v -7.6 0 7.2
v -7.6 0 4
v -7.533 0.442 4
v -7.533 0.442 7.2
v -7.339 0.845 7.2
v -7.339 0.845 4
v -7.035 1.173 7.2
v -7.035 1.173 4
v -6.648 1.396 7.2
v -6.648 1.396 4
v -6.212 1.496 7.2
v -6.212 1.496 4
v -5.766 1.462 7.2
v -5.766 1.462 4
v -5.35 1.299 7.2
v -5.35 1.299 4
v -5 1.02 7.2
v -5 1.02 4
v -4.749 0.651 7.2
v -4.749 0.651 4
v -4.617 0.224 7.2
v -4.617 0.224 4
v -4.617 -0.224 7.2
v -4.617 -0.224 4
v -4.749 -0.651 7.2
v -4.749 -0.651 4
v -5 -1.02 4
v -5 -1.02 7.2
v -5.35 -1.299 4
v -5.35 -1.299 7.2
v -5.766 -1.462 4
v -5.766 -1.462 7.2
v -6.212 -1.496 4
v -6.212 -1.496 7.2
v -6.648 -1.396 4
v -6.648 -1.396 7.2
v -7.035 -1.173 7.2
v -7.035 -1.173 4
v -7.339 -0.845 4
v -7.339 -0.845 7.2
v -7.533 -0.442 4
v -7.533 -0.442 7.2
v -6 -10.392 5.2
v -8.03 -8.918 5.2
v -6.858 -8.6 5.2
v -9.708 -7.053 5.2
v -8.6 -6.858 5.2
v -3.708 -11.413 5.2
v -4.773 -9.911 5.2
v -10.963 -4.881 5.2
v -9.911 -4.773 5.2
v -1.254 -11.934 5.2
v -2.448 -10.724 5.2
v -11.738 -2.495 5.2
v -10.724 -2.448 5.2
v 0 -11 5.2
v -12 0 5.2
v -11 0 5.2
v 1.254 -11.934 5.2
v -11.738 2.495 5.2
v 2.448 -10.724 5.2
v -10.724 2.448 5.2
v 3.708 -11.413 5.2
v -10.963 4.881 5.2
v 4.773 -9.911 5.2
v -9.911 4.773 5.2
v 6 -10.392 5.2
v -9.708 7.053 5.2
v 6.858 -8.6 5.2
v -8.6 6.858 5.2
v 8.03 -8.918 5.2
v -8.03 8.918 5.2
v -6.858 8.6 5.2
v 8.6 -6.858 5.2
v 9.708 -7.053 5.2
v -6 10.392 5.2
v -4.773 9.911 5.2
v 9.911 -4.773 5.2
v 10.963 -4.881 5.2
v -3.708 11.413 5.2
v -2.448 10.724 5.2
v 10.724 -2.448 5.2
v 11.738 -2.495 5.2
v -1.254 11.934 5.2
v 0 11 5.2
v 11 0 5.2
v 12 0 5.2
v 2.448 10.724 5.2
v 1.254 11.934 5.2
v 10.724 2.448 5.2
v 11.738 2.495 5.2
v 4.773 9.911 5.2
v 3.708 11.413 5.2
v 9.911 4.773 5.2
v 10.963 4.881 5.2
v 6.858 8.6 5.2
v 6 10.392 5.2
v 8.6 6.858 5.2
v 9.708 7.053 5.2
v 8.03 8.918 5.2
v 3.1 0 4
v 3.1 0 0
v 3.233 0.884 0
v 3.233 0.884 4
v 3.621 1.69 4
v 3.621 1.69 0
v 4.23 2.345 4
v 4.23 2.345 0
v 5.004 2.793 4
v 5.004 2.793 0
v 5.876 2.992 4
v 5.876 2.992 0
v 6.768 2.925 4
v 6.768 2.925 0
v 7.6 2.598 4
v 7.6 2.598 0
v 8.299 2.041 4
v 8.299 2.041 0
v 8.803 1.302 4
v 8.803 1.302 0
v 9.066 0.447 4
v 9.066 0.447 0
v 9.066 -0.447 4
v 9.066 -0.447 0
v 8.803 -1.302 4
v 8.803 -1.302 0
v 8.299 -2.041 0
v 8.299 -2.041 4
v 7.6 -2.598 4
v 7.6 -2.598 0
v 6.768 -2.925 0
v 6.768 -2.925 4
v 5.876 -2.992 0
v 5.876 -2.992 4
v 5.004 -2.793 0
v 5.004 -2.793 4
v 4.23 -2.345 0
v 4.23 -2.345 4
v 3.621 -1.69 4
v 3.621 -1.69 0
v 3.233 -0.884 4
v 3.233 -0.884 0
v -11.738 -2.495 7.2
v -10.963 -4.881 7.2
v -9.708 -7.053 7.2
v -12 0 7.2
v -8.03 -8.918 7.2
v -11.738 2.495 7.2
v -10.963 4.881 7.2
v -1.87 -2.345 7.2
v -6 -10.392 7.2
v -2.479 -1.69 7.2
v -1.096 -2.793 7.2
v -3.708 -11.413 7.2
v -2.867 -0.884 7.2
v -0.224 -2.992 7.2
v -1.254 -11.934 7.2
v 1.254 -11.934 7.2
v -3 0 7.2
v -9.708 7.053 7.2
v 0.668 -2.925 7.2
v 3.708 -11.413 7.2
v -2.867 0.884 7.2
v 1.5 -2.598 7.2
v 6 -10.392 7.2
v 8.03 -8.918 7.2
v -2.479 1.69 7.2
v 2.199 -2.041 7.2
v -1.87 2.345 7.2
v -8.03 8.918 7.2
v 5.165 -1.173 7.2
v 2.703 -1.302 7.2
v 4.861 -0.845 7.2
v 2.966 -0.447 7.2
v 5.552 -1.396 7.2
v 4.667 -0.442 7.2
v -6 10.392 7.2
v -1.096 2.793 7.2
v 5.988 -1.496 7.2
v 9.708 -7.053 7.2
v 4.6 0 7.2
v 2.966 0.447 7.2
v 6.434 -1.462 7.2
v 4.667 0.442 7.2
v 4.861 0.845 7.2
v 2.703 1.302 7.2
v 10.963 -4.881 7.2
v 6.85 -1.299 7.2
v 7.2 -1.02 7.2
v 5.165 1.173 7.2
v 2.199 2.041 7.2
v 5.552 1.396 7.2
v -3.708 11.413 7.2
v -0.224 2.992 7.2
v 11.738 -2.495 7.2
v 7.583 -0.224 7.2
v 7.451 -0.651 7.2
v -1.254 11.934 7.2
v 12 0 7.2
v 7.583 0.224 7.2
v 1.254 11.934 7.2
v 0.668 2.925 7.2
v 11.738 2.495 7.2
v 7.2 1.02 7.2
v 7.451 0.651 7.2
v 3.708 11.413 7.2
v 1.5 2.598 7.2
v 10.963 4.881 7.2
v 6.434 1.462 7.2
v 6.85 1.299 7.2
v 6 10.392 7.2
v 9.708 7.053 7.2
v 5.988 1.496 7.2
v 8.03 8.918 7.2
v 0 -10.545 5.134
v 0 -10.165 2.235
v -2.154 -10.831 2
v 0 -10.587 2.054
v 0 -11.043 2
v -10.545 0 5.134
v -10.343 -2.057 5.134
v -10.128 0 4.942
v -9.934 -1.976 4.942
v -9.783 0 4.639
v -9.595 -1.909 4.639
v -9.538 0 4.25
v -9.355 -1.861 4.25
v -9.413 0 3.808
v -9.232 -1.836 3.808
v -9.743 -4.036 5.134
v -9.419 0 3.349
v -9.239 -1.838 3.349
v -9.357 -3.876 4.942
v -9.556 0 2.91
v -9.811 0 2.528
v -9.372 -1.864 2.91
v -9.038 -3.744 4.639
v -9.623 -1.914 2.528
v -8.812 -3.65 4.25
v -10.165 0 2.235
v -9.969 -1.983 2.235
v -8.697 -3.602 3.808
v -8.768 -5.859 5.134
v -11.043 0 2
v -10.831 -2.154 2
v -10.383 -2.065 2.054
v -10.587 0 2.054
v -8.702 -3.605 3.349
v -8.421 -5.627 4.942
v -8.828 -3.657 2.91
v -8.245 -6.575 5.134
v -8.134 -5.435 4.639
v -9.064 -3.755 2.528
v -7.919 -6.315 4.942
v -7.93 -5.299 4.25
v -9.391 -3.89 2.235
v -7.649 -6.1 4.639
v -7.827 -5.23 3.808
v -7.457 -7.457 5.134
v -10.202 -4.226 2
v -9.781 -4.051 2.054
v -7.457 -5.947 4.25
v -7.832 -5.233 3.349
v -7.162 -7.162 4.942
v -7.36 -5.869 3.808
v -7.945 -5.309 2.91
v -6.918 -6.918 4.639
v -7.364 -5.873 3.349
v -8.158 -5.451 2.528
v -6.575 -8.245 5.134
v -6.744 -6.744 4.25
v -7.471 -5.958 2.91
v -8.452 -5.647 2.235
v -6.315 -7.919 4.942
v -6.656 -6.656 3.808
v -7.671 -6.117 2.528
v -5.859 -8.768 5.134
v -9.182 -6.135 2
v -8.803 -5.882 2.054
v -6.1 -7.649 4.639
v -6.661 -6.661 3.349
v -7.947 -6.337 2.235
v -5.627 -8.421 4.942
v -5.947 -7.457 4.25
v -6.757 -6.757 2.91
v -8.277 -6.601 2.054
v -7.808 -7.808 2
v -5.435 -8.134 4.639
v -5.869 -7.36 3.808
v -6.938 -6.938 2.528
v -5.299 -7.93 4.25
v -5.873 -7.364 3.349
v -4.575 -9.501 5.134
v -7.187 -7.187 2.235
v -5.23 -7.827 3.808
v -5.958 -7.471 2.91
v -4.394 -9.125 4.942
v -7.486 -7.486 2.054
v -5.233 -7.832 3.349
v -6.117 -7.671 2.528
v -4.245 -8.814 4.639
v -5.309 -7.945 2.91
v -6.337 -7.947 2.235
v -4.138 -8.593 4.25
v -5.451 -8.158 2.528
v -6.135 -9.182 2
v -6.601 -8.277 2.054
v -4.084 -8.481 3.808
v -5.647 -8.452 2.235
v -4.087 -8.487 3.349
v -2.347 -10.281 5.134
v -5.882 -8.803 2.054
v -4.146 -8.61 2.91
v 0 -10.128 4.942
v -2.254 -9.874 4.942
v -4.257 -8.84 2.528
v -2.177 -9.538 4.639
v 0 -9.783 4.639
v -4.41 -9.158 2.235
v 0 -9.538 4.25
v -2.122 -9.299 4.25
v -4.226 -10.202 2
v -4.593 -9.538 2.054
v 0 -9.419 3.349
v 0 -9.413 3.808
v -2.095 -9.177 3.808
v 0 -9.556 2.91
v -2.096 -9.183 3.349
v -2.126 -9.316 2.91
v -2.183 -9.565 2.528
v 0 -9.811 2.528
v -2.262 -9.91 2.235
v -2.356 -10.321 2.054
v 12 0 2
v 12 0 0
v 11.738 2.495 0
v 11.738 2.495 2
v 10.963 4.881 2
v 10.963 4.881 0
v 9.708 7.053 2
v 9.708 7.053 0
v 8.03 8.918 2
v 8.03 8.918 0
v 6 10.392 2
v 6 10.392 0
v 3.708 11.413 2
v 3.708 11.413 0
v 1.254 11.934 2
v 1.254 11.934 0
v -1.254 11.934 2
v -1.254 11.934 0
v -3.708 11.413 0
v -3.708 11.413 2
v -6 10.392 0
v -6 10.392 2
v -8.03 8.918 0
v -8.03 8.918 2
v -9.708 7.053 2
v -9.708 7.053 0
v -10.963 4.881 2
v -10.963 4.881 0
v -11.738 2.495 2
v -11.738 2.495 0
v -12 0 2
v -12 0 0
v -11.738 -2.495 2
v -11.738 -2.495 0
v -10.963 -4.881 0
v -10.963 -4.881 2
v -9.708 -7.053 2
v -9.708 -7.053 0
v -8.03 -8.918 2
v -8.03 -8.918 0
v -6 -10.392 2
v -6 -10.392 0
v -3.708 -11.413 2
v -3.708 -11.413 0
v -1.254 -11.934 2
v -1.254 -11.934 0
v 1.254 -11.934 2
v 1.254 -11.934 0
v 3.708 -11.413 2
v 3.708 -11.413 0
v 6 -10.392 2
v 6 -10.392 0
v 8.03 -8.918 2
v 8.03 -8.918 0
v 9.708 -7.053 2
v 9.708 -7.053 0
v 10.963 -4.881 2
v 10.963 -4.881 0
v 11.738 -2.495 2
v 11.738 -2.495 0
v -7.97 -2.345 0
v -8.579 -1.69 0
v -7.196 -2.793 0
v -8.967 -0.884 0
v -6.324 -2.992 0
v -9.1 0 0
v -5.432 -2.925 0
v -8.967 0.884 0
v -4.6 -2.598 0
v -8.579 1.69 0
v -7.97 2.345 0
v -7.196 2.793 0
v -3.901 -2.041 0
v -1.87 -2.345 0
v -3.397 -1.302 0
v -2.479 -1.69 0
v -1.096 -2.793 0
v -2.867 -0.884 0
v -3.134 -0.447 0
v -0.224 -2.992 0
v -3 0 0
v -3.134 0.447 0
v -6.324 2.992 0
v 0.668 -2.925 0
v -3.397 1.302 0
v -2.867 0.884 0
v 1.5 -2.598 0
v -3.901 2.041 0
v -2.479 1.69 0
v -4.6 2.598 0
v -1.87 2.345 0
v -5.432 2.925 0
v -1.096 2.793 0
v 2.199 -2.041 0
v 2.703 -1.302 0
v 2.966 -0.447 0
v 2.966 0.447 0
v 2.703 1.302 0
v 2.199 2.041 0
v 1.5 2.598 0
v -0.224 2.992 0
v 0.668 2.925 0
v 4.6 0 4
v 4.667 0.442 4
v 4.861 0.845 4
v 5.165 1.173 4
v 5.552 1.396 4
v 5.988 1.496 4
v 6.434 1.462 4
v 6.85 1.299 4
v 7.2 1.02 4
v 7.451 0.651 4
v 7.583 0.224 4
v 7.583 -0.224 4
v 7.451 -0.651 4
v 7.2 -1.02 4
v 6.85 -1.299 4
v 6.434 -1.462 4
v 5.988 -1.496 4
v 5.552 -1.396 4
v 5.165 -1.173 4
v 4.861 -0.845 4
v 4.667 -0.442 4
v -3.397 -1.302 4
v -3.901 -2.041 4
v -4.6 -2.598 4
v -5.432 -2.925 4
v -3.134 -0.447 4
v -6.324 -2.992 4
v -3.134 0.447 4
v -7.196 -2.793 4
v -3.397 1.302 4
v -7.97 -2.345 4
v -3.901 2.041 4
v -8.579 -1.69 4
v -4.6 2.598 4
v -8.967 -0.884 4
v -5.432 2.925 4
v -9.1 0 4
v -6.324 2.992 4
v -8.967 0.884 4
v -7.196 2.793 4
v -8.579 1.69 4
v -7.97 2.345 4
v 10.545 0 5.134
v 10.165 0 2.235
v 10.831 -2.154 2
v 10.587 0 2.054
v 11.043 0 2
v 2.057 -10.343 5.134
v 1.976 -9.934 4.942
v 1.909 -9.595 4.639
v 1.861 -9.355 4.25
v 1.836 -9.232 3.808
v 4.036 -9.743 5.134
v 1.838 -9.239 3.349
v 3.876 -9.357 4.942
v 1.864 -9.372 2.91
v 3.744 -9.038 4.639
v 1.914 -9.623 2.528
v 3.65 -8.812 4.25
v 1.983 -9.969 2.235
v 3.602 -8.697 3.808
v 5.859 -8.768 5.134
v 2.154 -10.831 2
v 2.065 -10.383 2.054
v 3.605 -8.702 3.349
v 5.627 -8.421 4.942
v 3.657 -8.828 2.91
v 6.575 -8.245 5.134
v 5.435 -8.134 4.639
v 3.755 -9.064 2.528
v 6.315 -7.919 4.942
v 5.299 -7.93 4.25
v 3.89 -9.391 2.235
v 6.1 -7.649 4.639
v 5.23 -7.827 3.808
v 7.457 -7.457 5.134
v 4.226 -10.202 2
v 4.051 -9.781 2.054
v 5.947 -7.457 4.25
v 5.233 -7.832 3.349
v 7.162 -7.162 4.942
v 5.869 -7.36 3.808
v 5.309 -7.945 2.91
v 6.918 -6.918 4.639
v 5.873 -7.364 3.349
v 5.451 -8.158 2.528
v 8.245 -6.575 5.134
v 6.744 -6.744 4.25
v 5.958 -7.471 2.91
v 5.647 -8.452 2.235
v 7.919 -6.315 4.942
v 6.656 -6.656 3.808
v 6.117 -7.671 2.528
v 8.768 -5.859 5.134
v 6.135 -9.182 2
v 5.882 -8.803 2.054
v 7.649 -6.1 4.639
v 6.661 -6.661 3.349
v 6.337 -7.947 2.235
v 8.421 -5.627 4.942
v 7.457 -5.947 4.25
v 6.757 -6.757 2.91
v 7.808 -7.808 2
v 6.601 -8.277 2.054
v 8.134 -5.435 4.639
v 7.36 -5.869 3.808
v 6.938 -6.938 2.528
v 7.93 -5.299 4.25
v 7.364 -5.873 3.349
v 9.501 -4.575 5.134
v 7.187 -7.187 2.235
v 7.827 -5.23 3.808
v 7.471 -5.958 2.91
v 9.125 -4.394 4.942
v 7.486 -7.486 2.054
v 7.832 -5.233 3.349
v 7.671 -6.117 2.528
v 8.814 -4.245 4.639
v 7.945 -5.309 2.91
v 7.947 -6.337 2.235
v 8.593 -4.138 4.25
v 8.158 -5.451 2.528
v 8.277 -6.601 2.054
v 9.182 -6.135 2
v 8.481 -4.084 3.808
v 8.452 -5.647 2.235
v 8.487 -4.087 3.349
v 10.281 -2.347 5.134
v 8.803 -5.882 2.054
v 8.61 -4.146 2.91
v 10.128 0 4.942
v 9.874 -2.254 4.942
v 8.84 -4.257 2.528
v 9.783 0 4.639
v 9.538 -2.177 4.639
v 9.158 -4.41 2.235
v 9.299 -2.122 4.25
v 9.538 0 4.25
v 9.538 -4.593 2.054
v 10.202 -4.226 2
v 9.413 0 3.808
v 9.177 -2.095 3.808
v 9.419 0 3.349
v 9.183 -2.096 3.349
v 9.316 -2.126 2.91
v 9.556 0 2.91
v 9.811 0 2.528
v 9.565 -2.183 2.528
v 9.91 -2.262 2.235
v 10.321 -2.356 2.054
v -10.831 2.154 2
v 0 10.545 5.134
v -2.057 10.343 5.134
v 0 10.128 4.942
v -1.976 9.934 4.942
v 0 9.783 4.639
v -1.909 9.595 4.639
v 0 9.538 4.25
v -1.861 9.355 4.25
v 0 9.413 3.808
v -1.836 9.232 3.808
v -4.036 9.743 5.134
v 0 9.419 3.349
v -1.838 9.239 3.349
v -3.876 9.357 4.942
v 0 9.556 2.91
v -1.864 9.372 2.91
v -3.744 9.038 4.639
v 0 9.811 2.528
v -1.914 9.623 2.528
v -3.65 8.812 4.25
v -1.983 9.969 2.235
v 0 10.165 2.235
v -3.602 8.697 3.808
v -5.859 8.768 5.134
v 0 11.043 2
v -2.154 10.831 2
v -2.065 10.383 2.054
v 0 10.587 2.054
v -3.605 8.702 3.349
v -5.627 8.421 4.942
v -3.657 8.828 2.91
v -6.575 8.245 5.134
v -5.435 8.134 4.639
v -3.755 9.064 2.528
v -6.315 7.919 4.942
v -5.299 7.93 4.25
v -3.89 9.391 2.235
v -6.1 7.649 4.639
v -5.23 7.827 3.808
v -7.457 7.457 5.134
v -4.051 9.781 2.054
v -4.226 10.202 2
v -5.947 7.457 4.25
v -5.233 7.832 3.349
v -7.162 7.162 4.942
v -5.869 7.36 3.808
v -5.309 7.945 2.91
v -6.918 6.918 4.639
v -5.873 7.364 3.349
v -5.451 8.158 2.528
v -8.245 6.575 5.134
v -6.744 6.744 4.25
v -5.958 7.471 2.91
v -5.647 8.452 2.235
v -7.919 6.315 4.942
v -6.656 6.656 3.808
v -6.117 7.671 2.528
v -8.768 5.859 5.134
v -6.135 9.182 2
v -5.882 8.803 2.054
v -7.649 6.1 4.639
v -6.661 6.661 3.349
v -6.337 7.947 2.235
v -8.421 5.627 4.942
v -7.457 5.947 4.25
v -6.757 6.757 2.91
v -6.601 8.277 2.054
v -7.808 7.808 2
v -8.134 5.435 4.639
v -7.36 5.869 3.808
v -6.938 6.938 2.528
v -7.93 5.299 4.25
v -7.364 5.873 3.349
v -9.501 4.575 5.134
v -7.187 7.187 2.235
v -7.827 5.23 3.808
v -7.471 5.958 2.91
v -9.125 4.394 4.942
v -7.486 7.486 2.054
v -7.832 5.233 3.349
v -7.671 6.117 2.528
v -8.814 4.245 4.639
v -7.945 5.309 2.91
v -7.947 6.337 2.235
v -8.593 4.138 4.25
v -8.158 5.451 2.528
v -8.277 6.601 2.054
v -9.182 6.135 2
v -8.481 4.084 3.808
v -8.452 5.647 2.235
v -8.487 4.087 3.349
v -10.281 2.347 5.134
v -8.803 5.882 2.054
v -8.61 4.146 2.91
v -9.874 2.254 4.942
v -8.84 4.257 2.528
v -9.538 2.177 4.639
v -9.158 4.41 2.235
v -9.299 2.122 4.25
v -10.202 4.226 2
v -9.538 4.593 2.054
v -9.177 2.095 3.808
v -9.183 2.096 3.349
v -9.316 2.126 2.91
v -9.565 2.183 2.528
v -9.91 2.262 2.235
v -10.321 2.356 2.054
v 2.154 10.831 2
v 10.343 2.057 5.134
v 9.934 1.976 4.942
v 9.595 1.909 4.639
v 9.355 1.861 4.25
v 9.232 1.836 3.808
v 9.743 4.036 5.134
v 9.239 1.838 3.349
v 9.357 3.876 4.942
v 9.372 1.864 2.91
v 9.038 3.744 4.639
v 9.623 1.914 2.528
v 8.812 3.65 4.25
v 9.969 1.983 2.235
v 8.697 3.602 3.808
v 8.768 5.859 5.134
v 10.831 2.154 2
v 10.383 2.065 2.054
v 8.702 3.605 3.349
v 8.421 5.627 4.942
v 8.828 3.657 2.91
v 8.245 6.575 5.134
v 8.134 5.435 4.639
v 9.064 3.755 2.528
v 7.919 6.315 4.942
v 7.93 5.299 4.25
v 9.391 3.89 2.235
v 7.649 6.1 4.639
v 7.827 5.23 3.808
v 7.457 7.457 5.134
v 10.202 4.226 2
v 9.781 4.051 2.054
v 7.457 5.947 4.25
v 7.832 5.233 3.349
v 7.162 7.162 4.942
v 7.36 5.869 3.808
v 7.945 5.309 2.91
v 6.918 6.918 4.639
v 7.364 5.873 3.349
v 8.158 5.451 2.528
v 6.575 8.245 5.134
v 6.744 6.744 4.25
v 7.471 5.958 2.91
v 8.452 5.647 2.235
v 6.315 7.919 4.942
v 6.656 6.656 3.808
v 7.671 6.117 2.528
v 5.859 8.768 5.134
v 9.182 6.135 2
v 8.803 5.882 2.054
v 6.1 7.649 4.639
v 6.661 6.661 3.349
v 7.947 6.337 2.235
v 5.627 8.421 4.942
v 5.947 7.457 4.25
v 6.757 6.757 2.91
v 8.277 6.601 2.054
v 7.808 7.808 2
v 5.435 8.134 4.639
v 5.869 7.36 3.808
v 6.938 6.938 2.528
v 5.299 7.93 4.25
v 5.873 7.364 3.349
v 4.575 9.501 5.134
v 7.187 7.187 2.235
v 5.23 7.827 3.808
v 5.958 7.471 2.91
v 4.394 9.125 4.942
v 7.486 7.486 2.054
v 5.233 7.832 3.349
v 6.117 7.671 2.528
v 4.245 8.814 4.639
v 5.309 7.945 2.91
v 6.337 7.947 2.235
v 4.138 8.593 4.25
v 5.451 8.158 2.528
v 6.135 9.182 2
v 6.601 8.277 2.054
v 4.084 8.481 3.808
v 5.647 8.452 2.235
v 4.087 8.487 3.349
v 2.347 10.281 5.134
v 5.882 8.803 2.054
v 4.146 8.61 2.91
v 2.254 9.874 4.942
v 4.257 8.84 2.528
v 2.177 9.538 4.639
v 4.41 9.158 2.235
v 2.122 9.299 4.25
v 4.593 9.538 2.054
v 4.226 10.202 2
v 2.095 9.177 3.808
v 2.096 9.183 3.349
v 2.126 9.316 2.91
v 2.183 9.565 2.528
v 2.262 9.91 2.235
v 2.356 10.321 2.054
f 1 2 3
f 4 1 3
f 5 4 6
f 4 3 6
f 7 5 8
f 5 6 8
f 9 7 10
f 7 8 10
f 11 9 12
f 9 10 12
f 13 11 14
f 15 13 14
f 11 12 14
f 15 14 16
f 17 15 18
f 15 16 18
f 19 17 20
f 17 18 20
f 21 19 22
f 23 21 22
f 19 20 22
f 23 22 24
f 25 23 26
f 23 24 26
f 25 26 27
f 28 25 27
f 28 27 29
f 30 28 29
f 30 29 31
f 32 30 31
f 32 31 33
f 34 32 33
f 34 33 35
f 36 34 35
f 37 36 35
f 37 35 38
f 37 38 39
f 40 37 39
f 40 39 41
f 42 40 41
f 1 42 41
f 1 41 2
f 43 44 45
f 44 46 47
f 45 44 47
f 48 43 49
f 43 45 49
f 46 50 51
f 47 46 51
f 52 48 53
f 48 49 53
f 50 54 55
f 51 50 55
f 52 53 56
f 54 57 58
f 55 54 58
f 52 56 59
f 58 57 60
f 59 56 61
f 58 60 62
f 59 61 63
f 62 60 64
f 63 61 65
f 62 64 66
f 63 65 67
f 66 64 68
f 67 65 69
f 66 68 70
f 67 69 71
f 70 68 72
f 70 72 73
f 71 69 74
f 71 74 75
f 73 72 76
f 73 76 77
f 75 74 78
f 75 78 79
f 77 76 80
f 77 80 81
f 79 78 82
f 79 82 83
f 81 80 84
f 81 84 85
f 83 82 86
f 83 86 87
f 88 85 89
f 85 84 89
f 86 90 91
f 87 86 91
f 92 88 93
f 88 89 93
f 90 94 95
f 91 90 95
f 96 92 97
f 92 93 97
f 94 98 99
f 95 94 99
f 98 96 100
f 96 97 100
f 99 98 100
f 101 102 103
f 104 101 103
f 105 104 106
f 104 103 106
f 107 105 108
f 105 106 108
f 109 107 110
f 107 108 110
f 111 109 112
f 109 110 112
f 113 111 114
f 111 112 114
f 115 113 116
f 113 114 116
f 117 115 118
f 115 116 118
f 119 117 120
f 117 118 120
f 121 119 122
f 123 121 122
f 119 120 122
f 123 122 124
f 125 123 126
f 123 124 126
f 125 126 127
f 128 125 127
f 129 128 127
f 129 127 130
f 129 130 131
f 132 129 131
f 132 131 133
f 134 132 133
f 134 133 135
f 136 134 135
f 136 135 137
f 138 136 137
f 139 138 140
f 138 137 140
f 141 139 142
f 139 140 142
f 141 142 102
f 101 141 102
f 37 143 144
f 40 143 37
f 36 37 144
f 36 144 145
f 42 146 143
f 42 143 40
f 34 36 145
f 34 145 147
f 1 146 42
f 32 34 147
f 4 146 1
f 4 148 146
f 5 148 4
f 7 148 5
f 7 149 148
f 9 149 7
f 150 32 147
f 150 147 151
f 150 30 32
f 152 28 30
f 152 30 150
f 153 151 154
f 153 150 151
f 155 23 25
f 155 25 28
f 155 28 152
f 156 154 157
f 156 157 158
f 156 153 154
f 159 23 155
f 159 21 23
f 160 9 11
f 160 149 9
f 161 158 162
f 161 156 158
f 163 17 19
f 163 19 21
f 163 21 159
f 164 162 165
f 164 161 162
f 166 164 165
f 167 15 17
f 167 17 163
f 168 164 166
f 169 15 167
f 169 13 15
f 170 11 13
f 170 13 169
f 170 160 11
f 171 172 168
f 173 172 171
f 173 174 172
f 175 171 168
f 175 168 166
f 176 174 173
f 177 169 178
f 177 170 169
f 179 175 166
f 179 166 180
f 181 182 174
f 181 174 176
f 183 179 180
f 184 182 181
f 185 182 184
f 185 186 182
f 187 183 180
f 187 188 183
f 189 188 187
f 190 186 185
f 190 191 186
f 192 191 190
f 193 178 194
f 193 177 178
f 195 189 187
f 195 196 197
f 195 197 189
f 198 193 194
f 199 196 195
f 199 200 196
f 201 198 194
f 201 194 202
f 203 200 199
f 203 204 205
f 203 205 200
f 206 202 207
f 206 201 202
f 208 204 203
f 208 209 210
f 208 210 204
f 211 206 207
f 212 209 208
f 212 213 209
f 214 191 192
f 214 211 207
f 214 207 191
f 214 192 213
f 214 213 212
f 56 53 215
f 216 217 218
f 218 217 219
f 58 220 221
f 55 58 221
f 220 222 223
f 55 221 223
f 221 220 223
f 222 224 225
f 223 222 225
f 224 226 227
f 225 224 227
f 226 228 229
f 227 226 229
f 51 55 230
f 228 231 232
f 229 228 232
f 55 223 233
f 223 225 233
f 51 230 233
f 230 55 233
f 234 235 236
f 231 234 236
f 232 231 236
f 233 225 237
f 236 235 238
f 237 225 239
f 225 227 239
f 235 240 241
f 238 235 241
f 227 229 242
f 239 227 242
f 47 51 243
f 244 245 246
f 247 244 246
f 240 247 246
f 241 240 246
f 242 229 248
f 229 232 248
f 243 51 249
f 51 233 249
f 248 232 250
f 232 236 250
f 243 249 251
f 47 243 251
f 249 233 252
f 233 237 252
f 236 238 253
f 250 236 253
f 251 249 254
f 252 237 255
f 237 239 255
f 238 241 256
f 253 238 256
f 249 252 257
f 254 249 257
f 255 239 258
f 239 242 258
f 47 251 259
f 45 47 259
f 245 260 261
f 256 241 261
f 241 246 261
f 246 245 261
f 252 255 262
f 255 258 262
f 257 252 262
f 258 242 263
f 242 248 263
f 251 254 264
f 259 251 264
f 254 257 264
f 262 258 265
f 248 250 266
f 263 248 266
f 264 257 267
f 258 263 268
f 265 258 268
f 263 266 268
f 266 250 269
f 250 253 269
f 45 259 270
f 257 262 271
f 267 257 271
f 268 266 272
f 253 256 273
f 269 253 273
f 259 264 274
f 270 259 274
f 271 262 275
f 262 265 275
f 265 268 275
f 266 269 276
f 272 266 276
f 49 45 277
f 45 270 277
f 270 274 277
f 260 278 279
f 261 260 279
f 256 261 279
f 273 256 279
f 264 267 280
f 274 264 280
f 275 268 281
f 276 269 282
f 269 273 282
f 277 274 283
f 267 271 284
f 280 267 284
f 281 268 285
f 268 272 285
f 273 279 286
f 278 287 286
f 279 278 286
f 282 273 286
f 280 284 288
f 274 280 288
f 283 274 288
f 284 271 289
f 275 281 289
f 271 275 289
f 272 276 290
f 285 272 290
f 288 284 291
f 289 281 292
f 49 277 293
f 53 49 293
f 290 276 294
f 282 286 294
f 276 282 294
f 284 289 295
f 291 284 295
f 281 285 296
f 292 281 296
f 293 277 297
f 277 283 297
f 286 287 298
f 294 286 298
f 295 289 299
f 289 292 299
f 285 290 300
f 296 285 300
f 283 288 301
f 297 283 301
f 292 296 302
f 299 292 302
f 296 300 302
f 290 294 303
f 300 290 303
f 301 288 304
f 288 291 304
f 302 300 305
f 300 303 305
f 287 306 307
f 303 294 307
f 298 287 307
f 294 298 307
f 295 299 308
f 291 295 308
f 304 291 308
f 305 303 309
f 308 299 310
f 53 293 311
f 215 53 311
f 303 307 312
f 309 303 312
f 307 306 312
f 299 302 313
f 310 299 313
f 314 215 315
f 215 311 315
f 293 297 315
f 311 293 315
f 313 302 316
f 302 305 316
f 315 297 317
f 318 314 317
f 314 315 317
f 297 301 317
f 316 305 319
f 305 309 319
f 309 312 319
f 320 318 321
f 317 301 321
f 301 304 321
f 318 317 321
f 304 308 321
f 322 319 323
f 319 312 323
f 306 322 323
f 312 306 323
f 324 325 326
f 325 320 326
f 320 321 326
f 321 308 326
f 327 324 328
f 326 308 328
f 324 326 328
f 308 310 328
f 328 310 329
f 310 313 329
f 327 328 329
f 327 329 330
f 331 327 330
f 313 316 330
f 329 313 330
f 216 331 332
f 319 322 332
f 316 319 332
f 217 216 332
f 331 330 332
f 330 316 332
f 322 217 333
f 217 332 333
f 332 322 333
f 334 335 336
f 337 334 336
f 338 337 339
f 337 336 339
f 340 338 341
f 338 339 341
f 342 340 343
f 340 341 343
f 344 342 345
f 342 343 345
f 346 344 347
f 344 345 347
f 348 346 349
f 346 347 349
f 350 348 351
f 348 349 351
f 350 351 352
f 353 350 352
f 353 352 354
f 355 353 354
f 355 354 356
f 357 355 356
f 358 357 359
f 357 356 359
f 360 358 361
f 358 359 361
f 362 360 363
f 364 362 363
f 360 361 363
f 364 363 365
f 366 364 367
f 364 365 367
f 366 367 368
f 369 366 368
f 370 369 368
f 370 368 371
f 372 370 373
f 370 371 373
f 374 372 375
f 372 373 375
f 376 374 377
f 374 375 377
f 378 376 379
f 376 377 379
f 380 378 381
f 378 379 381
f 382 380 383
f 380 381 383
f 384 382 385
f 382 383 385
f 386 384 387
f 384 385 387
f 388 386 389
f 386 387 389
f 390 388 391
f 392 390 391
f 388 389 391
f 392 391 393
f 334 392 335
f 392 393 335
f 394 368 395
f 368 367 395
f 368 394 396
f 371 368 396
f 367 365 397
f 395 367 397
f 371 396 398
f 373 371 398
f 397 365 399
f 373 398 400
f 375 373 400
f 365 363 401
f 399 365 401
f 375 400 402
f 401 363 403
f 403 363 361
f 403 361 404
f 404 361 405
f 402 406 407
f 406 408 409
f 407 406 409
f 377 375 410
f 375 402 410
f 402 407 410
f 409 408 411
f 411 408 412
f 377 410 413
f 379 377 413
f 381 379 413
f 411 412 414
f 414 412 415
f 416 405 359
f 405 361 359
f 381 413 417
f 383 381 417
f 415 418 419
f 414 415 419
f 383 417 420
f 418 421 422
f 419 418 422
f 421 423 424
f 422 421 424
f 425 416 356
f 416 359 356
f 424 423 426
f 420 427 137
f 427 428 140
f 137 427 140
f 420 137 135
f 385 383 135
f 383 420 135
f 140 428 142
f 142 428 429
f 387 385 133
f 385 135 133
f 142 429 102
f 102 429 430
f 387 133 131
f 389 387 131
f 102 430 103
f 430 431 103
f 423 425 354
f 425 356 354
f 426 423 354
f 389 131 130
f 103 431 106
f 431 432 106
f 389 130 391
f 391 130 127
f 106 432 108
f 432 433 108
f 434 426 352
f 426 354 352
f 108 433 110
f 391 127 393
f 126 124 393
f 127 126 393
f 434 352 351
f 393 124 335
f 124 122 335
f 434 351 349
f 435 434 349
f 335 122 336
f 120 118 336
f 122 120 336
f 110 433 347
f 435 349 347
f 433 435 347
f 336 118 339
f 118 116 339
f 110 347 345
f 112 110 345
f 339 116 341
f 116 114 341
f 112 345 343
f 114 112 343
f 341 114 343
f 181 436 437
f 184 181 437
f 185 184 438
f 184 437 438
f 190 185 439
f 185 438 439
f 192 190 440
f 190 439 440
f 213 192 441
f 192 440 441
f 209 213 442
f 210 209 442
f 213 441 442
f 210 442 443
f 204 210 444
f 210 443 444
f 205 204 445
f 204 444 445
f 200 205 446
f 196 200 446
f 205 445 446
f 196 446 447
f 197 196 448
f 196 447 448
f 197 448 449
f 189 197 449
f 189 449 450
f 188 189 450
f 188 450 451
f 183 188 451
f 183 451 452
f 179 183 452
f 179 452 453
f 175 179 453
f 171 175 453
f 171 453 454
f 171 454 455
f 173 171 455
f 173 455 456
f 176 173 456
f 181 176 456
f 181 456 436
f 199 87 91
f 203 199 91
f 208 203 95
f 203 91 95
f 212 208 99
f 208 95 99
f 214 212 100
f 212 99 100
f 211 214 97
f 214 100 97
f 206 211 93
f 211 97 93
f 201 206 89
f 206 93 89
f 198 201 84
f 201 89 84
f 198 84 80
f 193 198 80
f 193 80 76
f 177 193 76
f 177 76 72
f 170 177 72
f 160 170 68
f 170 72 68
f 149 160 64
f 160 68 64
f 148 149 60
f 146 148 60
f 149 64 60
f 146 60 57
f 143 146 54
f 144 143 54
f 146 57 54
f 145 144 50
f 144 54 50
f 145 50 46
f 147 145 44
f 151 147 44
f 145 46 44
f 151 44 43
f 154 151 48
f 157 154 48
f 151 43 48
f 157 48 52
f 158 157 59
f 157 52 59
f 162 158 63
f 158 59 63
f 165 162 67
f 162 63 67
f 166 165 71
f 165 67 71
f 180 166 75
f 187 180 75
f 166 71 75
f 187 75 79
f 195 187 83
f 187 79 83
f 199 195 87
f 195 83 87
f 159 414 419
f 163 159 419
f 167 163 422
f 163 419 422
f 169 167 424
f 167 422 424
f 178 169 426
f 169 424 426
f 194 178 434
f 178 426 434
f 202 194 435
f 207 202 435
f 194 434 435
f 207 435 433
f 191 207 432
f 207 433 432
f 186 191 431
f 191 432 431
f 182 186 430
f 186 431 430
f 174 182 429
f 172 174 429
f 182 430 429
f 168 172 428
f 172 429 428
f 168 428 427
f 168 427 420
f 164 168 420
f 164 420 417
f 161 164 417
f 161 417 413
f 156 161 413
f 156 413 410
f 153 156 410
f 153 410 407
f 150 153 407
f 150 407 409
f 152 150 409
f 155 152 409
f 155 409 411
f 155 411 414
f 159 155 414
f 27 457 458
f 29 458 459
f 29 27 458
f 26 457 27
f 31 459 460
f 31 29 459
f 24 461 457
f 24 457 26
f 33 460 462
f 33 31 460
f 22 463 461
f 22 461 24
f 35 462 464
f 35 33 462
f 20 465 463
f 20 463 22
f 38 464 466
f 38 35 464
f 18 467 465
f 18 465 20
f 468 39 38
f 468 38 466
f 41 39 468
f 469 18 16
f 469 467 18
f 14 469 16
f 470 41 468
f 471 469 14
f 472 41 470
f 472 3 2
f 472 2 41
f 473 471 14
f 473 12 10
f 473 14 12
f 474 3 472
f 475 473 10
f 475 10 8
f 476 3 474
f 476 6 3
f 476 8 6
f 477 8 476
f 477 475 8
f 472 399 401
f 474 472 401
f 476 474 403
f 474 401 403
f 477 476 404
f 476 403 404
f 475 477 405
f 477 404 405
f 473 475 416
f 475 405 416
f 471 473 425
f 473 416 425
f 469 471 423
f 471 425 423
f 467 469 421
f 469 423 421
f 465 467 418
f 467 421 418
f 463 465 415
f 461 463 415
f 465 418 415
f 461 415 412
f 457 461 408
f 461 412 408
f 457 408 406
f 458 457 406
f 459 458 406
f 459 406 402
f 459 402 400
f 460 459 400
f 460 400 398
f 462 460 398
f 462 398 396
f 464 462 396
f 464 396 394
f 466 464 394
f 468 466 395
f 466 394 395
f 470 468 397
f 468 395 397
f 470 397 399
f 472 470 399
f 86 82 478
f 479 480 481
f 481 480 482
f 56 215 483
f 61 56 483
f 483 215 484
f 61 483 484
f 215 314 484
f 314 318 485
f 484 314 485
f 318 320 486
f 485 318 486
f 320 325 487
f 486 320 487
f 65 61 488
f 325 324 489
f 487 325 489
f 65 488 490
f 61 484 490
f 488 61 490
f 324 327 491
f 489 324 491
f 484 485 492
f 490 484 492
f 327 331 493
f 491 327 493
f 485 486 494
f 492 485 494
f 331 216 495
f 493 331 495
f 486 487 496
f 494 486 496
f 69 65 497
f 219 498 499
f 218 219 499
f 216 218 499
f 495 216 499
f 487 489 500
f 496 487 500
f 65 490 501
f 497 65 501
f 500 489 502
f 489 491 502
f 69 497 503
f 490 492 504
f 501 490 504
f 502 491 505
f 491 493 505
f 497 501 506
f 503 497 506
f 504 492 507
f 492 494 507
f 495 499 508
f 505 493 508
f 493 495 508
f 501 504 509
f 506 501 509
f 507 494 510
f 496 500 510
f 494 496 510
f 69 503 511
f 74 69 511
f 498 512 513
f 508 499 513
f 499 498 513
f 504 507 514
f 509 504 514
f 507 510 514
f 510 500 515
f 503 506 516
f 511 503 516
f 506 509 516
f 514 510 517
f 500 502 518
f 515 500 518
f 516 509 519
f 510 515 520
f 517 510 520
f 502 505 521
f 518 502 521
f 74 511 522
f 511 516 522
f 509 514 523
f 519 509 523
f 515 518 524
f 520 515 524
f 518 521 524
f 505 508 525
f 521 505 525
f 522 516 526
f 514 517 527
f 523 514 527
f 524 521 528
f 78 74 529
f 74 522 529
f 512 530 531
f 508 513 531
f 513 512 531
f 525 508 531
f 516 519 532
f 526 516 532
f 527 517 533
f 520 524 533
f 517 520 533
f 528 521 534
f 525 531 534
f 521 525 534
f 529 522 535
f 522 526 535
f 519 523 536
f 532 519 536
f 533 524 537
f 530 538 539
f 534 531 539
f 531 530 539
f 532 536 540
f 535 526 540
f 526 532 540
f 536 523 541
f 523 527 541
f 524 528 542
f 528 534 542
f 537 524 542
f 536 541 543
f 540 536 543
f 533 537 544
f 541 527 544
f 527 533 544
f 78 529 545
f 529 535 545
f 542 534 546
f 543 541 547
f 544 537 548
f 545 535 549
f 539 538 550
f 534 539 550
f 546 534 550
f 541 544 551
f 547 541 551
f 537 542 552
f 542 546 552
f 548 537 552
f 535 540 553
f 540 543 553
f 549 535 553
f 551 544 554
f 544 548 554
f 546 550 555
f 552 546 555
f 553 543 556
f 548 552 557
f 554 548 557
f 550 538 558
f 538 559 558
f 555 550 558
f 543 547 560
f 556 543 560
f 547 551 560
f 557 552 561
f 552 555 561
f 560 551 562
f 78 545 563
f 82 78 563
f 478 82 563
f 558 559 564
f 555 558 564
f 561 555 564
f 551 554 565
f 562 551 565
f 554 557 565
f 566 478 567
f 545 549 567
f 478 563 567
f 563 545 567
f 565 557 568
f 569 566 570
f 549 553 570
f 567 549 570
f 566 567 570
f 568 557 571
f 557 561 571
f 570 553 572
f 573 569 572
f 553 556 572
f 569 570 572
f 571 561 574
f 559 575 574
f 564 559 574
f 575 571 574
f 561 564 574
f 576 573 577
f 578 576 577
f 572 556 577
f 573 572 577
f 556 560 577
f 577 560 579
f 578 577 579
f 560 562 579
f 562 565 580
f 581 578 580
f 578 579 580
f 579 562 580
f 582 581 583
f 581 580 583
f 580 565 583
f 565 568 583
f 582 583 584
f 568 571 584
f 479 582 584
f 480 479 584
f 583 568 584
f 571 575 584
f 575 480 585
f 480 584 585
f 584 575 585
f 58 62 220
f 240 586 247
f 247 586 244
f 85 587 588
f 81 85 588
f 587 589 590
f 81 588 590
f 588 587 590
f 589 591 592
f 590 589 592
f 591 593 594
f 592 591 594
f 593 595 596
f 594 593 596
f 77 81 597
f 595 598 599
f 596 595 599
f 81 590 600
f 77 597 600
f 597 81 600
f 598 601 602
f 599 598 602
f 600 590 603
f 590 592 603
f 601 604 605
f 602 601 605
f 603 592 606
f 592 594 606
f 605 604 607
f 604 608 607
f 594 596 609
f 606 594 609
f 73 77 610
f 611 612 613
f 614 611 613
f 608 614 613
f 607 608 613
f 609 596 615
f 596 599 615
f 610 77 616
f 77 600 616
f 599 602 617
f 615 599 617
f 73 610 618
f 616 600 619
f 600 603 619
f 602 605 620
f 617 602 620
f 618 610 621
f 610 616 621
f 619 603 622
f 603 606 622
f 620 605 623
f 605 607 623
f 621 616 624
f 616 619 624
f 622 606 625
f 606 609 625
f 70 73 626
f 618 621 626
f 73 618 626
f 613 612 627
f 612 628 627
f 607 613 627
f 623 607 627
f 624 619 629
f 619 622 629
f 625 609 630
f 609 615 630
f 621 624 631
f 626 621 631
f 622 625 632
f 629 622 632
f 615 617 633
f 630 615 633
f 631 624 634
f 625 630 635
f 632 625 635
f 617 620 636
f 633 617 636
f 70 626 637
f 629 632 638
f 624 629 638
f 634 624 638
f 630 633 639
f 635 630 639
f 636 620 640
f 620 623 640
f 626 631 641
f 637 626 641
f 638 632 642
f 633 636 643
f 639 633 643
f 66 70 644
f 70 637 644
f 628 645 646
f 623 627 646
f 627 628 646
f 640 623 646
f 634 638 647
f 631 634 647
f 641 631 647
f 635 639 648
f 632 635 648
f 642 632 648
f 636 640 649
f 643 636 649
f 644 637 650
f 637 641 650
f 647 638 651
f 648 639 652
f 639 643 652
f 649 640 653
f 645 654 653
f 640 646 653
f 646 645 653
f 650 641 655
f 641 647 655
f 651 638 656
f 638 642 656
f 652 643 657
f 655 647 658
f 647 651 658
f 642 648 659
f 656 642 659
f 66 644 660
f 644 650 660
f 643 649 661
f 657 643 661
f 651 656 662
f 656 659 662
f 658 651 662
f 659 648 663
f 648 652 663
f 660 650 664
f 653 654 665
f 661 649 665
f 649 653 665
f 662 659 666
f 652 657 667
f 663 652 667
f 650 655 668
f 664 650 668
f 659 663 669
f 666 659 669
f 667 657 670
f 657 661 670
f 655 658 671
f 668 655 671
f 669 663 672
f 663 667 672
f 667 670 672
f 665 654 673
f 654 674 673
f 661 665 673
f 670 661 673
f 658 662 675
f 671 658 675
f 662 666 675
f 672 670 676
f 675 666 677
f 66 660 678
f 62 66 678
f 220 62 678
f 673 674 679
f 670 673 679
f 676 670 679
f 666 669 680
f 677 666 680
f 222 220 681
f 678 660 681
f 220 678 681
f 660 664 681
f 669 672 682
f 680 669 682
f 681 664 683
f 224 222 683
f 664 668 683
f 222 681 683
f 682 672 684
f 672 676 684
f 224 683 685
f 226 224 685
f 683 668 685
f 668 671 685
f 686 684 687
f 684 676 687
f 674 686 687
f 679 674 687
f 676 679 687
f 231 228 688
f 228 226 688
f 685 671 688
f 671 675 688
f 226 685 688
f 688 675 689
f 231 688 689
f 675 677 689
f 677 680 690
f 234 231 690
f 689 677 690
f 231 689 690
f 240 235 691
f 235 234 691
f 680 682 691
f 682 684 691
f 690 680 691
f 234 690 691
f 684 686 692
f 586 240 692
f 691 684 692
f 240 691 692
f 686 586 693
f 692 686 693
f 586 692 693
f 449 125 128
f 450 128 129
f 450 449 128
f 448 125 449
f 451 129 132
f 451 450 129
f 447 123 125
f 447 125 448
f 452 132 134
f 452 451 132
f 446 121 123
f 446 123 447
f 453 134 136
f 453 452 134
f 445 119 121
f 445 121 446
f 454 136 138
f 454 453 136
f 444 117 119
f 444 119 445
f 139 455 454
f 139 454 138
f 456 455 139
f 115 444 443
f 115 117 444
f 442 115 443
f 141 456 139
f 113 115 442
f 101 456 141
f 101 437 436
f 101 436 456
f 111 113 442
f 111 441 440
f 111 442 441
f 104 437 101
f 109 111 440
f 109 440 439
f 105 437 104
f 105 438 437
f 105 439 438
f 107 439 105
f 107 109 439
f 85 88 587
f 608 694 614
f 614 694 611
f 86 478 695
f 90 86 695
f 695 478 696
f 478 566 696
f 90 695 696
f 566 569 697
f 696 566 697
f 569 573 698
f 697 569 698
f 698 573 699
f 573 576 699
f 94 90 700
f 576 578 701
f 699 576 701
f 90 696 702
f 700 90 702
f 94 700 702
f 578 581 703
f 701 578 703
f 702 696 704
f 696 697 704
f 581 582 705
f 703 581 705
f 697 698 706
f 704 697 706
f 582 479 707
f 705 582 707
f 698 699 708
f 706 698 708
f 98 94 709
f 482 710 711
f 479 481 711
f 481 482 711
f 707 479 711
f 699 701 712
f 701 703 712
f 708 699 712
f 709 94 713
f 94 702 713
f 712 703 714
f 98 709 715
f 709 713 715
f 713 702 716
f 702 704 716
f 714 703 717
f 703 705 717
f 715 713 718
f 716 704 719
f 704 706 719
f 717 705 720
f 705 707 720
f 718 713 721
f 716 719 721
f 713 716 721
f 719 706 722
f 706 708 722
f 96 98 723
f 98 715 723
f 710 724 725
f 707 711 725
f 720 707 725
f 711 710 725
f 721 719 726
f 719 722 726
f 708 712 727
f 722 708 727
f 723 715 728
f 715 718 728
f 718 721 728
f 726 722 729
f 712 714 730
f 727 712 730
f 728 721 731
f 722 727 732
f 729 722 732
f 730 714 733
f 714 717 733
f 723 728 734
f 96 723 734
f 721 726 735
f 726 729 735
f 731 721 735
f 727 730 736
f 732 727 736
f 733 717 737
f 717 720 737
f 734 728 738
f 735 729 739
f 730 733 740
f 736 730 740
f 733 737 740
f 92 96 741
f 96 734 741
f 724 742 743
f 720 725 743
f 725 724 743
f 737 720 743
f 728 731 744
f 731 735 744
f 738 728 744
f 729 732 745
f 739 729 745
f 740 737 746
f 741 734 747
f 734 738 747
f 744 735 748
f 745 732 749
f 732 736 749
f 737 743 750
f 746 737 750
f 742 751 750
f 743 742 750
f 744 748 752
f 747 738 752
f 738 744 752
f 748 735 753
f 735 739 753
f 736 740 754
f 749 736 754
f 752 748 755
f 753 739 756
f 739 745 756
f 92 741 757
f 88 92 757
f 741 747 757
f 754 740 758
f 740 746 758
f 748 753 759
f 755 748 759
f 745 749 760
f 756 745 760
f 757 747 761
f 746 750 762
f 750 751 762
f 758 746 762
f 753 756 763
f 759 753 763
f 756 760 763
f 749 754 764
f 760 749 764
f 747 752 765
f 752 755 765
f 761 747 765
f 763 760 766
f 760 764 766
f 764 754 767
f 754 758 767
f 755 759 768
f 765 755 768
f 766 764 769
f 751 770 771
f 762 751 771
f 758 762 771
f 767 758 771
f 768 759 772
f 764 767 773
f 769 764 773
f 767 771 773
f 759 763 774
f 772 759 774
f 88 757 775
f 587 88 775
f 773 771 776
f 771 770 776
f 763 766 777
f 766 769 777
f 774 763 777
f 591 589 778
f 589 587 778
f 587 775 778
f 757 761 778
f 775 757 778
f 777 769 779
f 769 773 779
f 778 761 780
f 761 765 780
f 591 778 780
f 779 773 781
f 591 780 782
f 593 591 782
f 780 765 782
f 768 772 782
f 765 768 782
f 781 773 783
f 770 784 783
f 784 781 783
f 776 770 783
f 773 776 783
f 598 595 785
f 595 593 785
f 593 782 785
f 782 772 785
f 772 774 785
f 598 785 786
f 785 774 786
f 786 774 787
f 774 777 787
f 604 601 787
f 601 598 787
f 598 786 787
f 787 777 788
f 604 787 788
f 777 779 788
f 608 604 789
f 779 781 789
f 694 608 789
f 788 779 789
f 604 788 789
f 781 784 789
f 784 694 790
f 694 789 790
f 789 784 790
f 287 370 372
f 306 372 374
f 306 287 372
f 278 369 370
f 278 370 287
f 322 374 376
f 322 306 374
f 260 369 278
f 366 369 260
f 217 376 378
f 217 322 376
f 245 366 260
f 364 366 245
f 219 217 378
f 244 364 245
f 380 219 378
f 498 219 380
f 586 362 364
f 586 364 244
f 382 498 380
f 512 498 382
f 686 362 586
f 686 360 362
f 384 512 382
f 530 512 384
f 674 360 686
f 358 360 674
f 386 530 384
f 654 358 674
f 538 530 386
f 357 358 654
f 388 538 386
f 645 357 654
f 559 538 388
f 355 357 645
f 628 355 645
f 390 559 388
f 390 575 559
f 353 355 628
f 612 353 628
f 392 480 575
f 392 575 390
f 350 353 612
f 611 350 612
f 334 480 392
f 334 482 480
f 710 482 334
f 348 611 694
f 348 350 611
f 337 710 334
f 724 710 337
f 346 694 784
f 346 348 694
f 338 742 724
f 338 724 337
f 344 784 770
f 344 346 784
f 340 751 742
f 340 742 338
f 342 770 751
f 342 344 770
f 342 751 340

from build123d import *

# Parameters (mm, degrees)
SKETCH_1_R          = 12
EXTRUDE_1_DEPTH     = 2
SKETCH_2_R          = 11
EXTRUDE_2_DEPTH     = 3.2
SKETCH_3_R          = 12
EXTRUDE_3_DEPTH     = 2
SKETCH_4_R          = 3
CUT_EXTRUDE_1_DEPTH = 30
SKETCH_5_R          = 1.5
CUT_EXTRUDE_4_DEPTH = 19.434749795
SKETCH_3D_2_R       = 1.600287212
SKETCH_7_R          = 3
CUT_EXTRUDE_9_DEPTH = 4


with BuildPart() as part:
    # ｽｹｯﾁ1 → ﾎﾞｽ - 押し出し1 (new body)
    with BuildSketch(Plane.XY):
        Circle(SKETCH_1_R)
    extrude(amount=EXTRUDE_1_DEPTH)

    # ｽｹｯﾁ2 → ﾎﾞｽ - 押し出し2 (add)
    with BuildSketch(Plane.XY.offset(2)):
        Circle(SKETCH_2_R)
    extrude(amount=EXTRUDE_2_DEPTH)

    # ｽｹｯﾁ3 → ﾎﾞｽ - 押し出し3 (add)
    with BuildSketch(Plane.XY.offset(5.2)):
        Circle(SKETCH_3_R)
    extrude(amount=EXTRUDE_3_DEPTH)

    # ｽｹｯﾁ4 → ｶｯﾄ - 押し出し1 (cut)
    with BuildSketch(Plane(origin=(0, 0, 0), x_dir=(-1, 0, 0), z_dir=(0, 0, -1))):
        Circle(SKETCH_4_R)
    extrude(amount=-CUT_EXTRUDE_1_DEPTH, mode=Mode.SUBTRACT)

    # ｽｹｯﾁ5 → ｶｯﾄ - 押し出し4 (cut, through all)
    with BuildSketch(Plane(origin=(0, 0, 0), x_dir=(-1, 0, 0), z_dir=(0, 0, -1))):
        with Locations((-6.1, 0)):
            Circle(SKETCH_5_R)
        with Locations((6.1, 0)):
            Circle(SKETCH_5_R)
    extrude(amount=-CUT_EXTRUDE_4_DEPTH, mode=Mode.SUBTRACT)

    # ｶｯﾄ - ｽｲｰﾌﾟ2: sweep along a curve in space
    with BuildLine() as sweep_2_path:
        ThreePointArc((11, 0, 5.2), (7.778174593, 7.778174593, 5.2), (0, 11, 5.2))
        ThreePointArc((0, 11, 5.2), (-7.778174593, 7.778174593, 5.2), (-11, 0, 5.2))
        ThreePointArc((-11, 0, 5.2), (-7.778174593, -7.778174593, 5.2), (0, -11, 5.2))
        ThreePointArc((0, -11, 5.2), (7.778174593, -7.778174593, 5.2), (11, 0, 5.2))
    # Sketch 3D_2 → ｶｯﾄ - ｽｲｰﾌﾟ2 (sweep, cut)
    with BuildSketch(Plane(origin=(-11, 0, 5.2), x_dir=(0, 0, -1), z_dir=(0, -1, 0))):
        with Locations((1.600287212, 0)):
            Circle(SKETCH_3D_2_R)
    sweep(path=sweep_2_path.line, mode=Mode.SUBTRACT)

    # ｽｹｯﾁ7 → ｶｯﾄ - 押し出し9 (cut)
    with BuildSketch(Plane(origin=(0, 0, 0), x_dir=(-1, 0, 0), z_dir=(0, 0, -1))):
        with Locations((-6.1, 0)):
            Circle(SKETCH_7_R)
        with Locations((6.1, 0)):
            Circle(SKETCH_7_R)
    extrude(amount=-CUT_EXTRUDE_9_DEPTH, mode=Mode.SUBTRACT)


solid = part.part
